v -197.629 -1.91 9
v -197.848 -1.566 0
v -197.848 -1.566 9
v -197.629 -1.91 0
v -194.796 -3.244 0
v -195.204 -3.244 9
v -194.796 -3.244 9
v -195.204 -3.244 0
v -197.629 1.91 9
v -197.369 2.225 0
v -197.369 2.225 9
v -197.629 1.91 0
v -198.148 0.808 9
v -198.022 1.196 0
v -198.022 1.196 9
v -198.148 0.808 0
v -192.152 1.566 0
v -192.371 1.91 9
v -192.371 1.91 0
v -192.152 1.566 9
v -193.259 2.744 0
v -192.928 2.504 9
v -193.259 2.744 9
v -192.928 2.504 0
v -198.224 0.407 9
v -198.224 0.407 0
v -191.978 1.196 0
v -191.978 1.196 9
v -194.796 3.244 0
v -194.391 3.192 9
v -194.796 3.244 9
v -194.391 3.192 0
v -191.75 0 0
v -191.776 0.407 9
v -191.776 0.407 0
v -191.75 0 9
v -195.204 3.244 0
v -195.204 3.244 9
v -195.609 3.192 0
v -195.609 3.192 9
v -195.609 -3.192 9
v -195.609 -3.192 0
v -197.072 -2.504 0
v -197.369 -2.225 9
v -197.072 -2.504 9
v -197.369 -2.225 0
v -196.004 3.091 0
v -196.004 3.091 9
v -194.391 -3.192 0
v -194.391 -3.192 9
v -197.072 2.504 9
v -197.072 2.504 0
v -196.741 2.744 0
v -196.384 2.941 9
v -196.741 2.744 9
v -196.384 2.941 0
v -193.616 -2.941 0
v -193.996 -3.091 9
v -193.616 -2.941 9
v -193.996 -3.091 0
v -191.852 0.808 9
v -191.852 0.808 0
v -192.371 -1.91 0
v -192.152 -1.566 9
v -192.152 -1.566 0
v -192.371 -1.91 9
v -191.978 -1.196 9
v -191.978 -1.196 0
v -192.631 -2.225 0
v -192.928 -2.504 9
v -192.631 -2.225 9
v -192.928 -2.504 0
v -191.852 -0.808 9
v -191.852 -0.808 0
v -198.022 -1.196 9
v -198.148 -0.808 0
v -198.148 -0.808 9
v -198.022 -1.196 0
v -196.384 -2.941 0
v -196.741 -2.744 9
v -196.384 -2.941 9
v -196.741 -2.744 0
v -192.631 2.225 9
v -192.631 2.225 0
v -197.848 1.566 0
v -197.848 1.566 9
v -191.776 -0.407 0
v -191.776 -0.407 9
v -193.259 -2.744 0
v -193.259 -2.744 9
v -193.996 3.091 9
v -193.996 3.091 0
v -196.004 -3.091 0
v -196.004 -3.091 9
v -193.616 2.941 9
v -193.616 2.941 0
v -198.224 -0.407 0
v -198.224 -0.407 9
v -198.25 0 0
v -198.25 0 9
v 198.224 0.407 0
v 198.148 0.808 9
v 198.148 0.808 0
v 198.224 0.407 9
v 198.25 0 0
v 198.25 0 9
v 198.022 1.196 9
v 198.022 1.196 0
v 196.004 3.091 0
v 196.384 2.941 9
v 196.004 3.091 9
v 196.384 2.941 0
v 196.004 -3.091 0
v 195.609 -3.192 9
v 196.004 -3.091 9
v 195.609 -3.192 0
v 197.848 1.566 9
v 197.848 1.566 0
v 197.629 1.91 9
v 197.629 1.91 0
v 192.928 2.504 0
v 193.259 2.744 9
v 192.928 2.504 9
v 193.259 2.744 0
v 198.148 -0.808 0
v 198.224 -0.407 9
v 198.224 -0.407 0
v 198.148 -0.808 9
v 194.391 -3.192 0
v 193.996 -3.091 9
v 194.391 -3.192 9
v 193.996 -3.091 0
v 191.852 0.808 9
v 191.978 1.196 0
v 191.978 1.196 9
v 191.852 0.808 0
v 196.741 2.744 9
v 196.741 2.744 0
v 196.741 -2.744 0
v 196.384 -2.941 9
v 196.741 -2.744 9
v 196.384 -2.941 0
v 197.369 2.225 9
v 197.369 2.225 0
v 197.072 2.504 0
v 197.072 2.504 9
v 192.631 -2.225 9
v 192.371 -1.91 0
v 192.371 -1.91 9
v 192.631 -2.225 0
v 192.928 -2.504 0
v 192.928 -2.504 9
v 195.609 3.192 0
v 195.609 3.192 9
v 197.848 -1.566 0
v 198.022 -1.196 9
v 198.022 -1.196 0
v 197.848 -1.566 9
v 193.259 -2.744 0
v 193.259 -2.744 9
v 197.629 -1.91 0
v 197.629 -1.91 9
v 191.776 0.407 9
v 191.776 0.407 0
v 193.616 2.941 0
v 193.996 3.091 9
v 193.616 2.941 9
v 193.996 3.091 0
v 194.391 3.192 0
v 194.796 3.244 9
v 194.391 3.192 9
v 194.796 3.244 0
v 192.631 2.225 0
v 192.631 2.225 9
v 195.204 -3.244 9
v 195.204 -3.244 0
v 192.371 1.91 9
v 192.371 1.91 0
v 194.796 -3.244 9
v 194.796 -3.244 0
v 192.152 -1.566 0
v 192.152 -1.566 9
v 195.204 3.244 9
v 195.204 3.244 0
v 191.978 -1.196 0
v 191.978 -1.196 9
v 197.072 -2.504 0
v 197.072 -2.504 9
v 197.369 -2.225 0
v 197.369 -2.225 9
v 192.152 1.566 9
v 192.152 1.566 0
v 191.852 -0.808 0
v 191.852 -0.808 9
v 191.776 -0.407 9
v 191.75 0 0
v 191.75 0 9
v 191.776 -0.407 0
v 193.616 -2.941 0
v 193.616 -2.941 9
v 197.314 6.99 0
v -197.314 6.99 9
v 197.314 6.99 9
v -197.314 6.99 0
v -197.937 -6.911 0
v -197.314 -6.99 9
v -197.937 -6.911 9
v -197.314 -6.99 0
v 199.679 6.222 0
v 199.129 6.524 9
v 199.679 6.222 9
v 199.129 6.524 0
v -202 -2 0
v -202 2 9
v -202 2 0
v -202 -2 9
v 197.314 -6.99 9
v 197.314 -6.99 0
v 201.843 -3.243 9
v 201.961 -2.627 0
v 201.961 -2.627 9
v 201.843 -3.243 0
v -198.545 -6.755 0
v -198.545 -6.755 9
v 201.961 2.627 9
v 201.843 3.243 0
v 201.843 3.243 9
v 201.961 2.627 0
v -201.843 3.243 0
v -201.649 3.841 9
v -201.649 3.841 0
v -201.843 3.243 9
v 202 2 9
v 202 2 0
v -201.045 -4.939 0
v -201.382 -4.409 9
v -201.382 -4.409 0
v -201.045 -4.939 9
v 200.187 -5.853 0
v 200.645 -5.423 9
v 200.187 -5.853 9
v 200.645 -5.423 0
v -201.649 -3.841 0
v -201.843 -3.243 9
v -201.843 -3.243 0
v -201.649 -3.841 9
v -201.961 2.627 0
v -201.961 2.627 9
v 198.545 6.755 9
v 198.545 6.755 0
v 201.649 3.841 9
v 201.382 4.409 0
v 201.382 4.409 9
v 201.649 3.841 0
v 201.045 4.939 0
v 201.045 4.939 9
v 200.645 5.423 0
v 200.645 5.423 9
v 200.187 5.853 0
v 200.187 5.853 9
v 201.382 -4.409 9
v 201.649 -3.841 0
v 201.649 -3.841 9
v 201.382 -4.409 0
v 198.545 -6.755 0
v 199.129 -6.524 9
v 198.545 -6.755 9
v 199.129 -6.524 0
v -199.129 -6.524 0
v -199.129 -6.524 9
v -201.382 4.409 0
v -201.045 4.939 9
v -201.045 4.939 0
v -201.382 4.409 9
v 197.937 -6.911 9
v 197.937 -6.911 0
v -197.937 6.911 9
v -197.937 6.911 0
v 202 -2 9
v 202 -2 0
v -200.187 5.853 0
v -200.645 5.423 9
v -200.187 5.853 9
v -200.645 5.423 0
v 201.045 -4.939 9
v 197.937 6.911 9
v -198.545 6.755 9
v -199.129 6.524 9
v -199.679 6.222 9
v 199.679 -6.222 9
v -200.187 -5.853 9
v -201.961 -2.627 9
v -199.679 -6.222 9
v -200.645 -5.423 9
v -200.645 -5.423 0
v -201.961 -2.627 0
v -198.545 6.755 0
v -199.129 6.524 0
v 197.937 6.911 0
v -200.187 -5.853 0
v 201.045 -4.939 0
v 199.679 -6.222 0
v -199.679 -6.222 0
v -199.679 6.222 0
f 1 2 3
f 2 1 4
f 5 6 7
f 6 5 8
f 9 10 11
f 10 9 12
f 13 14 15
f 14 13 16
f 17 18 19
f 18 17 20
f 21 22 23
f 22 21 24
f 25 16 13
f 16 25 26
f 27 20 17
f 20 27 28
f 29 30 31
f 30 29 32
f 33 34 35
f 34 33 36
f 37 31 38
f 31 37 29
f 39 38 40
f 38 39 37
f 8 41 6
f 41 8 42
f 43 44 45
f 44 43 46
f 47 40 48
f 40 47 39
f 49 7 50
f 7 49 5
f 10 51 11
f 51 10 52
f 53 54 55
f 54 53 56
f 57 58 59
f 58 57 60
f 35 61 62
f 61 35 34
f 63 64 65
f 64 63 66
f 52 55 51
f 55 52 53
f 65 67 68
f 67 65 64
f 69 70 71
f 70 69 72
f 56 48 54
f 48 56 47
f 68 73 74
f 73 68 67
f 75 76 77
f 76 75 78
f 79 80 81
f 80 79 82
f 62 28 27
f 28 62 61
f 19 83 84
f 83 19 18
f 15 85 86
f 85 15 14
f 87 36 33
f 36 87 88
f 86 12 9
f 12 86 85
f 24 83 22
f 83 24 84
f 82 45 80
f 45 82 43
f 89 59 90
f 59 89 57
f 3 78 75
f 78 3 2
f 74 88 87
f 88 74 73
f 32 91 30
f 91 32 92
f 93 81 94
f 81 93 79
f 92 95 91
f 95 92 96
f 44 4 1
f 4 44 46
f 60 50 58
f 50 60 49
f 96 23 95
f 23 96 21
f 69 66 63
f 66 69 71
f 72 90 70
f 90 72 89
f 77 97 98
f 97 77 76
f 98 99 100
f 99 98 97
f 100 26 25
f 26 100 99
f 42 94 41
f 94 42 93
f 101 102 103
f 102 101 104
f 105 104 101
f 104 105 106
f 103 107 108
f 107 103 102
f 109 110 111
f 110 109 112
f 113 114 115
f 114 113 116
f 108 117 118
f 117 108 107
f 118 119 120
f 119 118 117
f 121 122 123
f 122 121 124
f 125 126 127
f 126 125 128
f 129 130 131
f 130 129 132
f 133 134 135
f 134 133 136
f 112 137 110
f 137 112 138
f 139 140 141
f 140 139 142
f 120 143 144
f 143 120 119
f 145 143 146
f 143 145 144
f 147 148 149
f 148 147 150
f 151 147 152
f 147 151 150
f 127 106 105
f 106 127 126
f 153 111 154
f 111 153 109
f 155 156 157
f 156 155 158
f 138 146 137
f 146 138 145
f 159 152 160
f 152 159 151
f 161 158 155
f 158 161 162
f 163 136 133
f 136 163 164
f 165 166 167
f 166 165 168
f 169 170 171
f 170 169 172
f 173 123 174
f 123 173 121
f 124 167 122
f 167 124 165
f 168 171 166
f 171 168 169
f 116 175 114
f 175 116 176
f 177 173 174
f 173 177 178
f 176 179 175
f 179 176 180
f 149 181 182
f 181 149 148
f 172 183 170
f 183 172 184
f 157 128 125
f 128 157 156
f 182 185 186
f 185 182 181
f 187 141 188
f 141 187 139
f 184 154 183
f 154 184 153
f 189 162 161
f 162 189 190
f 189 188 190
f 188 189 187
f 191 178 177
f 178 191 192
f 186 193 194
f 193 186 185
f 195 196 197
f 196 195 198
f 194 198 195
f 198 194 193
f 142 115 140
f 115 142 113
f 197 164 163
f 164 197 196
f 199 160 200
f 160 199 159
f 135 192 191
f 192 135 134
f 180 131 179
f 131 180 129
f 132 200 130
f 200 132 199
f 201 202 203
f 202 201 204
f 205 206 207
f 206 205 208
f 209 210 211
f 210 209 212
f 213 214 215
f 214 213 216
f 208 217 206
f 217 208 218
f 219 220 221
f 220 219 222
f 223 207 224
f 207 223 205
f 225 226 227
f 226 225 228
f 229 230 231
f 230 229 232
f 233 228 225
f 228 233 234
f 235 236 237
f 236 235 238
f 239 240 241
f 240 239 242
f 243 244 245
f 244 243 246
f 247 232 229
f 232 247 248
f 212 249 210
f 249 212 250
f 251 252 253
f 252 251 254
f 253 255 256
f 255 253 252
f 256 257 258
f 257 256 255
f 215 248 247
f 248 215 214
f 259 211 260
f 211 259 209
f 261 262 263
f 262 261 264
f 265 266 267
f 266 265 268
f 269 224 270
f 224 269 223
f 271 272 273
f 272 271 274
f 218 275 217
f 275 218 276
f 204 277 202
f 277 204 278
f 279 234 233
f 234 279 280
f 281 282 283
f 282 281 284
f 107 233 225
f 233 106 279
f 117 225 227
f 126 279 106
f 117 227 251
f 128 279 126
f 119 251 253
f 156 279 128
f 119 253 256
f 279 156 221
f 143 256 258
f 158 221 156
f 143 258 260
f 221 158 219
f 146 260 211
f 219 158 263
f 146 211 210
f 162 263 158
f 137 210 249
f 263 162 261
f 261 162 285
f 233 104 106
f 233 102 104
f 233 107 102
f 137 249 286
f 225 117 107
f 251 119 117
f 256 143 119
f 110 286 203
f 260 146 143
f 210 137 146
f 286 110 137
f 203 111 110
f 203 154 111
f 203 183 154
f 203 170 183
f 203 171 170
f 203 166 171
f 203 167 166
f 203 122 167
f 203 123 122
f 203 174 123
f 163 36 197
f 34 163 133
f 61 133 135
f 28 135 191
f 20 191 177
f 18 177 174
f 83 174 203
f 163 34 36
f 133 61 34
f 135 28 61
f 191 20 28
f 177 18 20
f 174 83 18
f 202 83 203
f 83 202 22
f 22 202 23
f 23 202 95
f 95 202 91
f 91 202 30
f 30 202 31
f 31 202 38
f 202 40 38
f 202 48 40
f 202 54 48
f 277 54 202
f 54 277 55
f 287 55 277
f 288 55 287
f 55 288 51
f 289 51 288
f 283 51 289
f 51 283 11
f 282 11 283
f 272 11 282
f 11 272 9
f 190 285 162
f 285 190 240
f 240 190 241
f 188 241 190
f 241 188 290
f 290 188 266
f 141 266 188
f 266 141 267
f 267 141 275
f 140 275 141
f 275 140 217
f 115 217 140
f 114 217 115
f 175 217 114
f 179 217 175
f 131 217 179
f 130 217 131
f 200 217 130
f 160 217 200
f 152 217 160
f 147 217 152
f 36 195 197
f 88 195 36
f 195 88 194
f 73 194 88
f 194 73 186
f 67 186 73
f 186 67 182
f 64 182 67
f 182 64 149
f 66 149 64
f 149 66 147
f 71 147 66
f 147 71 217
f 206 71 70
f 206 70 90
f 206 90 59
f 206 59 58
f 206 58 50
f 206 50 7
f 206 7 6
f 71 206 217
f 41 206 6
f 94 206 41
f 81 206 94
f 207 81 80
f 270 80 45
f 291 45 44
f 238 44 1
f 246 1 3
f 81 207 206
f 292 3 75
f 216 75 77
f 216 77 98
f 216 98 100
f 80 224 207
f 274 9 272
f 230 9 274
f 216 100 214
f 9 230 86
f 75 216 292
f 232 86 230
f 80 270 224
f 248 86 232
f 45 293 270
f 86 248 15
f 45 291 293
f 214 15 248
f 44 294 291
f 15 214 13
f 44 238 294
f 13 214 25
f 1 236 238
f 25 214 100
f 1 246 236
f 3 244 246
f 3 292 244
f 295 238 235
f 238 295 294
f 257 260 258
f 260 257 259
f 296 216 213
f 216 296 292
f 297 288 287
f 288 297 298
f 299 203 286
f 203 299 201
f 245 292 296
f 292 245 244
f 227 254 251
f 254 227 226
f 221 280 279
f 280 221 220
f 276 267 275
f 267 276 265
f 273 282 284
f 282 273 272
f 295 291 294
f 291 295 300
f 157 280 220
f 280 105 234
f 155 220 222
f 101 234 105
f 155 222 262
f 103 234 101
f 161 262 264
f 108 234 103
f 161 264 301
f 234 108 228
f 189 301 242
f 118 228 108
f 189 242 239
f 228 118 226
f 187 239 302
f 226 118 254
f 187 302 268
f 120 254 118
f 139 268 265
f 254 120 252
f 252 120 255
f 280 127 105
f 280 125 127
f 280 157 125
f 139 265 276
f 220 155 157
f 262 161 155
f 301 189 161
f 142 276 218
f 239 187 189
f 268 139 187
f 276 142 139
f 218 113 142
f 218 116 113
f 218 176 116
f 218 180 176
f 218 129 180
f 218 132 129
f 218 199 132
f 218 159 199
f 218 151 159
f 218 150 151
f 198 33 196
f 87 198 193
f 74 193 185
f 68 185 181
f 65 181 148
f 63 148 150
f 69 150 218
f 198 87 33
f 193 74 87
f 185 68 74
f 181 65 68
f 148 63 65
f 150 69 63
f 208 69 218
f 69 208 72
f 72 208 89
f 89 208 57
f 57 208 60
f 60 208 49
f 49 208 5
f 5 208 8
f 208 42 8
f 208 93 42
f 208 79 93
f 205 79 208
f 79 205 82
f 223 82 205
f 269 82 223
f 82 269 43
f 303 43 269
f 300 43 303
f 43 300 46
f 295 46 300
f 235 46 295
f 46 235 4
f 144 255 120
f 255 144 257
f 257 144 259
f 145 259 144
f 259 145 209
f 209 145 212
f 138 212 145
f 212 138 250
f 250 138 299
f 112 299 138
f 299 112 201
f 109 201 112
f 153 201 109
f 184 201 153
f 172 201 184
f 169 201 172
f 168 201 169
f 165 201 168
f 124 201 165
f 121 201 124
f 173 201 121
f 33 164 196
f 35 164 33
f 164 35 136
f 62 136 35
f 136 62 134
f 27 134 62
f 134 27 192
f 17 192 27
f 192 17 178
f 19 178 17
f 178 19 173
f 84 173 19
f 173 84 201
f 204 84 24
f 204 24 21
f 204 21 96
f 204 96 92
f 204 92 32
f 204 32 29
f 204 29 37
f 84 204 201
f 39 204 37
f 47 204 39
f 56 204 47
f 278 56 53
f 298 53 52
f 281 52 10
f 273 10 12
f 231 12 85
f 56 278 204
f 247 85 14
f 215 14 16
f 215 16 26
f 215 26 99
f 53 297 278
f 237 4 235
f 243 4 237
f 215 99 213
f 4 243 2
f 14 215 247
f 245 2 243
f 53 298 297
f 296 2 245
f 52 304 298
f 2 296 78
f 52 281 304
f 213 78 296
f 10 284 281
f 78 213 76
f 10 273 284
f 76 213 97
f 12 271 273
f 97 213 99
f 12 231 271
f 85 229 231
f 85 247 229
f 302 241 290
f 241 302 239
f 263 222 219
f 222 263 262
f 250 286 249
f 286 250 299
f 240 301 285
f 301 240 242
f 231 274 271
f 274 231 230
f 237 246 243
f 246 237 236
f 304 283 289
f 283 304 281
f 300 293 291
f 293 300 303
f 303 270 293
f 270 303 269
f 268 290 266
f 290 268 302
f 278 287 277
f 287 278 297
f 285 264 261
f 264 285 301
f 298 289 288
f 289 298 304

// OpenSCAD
$fn = 50;


difference() {
	union() {
		hull() {
			translate(v = [-197.0000000000, 2.0000000000, 0]) {
				cylinder(h = 9, r = 5);
			}
			translate(v = [197.0000000000, 2.0000000000, 0]) {
				cylinder(h = 9, r = 5);
			}
			translate(v = [-197.0000000000, -2.0000000000, 0]) {
				cylinder(h = 9, r = 5);
			}
			translate(v = [197.0000000000, -2.0000000000, 0]) {
				cylinder(h = 9, r = 5);
			}
		}
	}
	union() {
		translate(v = [-195.0000000000, 0.0000000000, -100.0000000000]) {
			cylinder(h = 200, r = 3.2500000000);
		}
		translate(v = [-195.0000000000, 0.0000000000, -100.0000000000]) {
			cylinder(h = 200, r = 3.2500000000);
		}
		translate(v = [195.0000000000, 0.0000000000, -100.0000000000]) {
			cylinder(h = 200, r = 3.2500000000);
		}
		translate(v = [195.0000000000, 0.0000000000, -100.0000000000]) {
			cylinder(h = 200, r = 3.2500000000);
		}
	}
}
